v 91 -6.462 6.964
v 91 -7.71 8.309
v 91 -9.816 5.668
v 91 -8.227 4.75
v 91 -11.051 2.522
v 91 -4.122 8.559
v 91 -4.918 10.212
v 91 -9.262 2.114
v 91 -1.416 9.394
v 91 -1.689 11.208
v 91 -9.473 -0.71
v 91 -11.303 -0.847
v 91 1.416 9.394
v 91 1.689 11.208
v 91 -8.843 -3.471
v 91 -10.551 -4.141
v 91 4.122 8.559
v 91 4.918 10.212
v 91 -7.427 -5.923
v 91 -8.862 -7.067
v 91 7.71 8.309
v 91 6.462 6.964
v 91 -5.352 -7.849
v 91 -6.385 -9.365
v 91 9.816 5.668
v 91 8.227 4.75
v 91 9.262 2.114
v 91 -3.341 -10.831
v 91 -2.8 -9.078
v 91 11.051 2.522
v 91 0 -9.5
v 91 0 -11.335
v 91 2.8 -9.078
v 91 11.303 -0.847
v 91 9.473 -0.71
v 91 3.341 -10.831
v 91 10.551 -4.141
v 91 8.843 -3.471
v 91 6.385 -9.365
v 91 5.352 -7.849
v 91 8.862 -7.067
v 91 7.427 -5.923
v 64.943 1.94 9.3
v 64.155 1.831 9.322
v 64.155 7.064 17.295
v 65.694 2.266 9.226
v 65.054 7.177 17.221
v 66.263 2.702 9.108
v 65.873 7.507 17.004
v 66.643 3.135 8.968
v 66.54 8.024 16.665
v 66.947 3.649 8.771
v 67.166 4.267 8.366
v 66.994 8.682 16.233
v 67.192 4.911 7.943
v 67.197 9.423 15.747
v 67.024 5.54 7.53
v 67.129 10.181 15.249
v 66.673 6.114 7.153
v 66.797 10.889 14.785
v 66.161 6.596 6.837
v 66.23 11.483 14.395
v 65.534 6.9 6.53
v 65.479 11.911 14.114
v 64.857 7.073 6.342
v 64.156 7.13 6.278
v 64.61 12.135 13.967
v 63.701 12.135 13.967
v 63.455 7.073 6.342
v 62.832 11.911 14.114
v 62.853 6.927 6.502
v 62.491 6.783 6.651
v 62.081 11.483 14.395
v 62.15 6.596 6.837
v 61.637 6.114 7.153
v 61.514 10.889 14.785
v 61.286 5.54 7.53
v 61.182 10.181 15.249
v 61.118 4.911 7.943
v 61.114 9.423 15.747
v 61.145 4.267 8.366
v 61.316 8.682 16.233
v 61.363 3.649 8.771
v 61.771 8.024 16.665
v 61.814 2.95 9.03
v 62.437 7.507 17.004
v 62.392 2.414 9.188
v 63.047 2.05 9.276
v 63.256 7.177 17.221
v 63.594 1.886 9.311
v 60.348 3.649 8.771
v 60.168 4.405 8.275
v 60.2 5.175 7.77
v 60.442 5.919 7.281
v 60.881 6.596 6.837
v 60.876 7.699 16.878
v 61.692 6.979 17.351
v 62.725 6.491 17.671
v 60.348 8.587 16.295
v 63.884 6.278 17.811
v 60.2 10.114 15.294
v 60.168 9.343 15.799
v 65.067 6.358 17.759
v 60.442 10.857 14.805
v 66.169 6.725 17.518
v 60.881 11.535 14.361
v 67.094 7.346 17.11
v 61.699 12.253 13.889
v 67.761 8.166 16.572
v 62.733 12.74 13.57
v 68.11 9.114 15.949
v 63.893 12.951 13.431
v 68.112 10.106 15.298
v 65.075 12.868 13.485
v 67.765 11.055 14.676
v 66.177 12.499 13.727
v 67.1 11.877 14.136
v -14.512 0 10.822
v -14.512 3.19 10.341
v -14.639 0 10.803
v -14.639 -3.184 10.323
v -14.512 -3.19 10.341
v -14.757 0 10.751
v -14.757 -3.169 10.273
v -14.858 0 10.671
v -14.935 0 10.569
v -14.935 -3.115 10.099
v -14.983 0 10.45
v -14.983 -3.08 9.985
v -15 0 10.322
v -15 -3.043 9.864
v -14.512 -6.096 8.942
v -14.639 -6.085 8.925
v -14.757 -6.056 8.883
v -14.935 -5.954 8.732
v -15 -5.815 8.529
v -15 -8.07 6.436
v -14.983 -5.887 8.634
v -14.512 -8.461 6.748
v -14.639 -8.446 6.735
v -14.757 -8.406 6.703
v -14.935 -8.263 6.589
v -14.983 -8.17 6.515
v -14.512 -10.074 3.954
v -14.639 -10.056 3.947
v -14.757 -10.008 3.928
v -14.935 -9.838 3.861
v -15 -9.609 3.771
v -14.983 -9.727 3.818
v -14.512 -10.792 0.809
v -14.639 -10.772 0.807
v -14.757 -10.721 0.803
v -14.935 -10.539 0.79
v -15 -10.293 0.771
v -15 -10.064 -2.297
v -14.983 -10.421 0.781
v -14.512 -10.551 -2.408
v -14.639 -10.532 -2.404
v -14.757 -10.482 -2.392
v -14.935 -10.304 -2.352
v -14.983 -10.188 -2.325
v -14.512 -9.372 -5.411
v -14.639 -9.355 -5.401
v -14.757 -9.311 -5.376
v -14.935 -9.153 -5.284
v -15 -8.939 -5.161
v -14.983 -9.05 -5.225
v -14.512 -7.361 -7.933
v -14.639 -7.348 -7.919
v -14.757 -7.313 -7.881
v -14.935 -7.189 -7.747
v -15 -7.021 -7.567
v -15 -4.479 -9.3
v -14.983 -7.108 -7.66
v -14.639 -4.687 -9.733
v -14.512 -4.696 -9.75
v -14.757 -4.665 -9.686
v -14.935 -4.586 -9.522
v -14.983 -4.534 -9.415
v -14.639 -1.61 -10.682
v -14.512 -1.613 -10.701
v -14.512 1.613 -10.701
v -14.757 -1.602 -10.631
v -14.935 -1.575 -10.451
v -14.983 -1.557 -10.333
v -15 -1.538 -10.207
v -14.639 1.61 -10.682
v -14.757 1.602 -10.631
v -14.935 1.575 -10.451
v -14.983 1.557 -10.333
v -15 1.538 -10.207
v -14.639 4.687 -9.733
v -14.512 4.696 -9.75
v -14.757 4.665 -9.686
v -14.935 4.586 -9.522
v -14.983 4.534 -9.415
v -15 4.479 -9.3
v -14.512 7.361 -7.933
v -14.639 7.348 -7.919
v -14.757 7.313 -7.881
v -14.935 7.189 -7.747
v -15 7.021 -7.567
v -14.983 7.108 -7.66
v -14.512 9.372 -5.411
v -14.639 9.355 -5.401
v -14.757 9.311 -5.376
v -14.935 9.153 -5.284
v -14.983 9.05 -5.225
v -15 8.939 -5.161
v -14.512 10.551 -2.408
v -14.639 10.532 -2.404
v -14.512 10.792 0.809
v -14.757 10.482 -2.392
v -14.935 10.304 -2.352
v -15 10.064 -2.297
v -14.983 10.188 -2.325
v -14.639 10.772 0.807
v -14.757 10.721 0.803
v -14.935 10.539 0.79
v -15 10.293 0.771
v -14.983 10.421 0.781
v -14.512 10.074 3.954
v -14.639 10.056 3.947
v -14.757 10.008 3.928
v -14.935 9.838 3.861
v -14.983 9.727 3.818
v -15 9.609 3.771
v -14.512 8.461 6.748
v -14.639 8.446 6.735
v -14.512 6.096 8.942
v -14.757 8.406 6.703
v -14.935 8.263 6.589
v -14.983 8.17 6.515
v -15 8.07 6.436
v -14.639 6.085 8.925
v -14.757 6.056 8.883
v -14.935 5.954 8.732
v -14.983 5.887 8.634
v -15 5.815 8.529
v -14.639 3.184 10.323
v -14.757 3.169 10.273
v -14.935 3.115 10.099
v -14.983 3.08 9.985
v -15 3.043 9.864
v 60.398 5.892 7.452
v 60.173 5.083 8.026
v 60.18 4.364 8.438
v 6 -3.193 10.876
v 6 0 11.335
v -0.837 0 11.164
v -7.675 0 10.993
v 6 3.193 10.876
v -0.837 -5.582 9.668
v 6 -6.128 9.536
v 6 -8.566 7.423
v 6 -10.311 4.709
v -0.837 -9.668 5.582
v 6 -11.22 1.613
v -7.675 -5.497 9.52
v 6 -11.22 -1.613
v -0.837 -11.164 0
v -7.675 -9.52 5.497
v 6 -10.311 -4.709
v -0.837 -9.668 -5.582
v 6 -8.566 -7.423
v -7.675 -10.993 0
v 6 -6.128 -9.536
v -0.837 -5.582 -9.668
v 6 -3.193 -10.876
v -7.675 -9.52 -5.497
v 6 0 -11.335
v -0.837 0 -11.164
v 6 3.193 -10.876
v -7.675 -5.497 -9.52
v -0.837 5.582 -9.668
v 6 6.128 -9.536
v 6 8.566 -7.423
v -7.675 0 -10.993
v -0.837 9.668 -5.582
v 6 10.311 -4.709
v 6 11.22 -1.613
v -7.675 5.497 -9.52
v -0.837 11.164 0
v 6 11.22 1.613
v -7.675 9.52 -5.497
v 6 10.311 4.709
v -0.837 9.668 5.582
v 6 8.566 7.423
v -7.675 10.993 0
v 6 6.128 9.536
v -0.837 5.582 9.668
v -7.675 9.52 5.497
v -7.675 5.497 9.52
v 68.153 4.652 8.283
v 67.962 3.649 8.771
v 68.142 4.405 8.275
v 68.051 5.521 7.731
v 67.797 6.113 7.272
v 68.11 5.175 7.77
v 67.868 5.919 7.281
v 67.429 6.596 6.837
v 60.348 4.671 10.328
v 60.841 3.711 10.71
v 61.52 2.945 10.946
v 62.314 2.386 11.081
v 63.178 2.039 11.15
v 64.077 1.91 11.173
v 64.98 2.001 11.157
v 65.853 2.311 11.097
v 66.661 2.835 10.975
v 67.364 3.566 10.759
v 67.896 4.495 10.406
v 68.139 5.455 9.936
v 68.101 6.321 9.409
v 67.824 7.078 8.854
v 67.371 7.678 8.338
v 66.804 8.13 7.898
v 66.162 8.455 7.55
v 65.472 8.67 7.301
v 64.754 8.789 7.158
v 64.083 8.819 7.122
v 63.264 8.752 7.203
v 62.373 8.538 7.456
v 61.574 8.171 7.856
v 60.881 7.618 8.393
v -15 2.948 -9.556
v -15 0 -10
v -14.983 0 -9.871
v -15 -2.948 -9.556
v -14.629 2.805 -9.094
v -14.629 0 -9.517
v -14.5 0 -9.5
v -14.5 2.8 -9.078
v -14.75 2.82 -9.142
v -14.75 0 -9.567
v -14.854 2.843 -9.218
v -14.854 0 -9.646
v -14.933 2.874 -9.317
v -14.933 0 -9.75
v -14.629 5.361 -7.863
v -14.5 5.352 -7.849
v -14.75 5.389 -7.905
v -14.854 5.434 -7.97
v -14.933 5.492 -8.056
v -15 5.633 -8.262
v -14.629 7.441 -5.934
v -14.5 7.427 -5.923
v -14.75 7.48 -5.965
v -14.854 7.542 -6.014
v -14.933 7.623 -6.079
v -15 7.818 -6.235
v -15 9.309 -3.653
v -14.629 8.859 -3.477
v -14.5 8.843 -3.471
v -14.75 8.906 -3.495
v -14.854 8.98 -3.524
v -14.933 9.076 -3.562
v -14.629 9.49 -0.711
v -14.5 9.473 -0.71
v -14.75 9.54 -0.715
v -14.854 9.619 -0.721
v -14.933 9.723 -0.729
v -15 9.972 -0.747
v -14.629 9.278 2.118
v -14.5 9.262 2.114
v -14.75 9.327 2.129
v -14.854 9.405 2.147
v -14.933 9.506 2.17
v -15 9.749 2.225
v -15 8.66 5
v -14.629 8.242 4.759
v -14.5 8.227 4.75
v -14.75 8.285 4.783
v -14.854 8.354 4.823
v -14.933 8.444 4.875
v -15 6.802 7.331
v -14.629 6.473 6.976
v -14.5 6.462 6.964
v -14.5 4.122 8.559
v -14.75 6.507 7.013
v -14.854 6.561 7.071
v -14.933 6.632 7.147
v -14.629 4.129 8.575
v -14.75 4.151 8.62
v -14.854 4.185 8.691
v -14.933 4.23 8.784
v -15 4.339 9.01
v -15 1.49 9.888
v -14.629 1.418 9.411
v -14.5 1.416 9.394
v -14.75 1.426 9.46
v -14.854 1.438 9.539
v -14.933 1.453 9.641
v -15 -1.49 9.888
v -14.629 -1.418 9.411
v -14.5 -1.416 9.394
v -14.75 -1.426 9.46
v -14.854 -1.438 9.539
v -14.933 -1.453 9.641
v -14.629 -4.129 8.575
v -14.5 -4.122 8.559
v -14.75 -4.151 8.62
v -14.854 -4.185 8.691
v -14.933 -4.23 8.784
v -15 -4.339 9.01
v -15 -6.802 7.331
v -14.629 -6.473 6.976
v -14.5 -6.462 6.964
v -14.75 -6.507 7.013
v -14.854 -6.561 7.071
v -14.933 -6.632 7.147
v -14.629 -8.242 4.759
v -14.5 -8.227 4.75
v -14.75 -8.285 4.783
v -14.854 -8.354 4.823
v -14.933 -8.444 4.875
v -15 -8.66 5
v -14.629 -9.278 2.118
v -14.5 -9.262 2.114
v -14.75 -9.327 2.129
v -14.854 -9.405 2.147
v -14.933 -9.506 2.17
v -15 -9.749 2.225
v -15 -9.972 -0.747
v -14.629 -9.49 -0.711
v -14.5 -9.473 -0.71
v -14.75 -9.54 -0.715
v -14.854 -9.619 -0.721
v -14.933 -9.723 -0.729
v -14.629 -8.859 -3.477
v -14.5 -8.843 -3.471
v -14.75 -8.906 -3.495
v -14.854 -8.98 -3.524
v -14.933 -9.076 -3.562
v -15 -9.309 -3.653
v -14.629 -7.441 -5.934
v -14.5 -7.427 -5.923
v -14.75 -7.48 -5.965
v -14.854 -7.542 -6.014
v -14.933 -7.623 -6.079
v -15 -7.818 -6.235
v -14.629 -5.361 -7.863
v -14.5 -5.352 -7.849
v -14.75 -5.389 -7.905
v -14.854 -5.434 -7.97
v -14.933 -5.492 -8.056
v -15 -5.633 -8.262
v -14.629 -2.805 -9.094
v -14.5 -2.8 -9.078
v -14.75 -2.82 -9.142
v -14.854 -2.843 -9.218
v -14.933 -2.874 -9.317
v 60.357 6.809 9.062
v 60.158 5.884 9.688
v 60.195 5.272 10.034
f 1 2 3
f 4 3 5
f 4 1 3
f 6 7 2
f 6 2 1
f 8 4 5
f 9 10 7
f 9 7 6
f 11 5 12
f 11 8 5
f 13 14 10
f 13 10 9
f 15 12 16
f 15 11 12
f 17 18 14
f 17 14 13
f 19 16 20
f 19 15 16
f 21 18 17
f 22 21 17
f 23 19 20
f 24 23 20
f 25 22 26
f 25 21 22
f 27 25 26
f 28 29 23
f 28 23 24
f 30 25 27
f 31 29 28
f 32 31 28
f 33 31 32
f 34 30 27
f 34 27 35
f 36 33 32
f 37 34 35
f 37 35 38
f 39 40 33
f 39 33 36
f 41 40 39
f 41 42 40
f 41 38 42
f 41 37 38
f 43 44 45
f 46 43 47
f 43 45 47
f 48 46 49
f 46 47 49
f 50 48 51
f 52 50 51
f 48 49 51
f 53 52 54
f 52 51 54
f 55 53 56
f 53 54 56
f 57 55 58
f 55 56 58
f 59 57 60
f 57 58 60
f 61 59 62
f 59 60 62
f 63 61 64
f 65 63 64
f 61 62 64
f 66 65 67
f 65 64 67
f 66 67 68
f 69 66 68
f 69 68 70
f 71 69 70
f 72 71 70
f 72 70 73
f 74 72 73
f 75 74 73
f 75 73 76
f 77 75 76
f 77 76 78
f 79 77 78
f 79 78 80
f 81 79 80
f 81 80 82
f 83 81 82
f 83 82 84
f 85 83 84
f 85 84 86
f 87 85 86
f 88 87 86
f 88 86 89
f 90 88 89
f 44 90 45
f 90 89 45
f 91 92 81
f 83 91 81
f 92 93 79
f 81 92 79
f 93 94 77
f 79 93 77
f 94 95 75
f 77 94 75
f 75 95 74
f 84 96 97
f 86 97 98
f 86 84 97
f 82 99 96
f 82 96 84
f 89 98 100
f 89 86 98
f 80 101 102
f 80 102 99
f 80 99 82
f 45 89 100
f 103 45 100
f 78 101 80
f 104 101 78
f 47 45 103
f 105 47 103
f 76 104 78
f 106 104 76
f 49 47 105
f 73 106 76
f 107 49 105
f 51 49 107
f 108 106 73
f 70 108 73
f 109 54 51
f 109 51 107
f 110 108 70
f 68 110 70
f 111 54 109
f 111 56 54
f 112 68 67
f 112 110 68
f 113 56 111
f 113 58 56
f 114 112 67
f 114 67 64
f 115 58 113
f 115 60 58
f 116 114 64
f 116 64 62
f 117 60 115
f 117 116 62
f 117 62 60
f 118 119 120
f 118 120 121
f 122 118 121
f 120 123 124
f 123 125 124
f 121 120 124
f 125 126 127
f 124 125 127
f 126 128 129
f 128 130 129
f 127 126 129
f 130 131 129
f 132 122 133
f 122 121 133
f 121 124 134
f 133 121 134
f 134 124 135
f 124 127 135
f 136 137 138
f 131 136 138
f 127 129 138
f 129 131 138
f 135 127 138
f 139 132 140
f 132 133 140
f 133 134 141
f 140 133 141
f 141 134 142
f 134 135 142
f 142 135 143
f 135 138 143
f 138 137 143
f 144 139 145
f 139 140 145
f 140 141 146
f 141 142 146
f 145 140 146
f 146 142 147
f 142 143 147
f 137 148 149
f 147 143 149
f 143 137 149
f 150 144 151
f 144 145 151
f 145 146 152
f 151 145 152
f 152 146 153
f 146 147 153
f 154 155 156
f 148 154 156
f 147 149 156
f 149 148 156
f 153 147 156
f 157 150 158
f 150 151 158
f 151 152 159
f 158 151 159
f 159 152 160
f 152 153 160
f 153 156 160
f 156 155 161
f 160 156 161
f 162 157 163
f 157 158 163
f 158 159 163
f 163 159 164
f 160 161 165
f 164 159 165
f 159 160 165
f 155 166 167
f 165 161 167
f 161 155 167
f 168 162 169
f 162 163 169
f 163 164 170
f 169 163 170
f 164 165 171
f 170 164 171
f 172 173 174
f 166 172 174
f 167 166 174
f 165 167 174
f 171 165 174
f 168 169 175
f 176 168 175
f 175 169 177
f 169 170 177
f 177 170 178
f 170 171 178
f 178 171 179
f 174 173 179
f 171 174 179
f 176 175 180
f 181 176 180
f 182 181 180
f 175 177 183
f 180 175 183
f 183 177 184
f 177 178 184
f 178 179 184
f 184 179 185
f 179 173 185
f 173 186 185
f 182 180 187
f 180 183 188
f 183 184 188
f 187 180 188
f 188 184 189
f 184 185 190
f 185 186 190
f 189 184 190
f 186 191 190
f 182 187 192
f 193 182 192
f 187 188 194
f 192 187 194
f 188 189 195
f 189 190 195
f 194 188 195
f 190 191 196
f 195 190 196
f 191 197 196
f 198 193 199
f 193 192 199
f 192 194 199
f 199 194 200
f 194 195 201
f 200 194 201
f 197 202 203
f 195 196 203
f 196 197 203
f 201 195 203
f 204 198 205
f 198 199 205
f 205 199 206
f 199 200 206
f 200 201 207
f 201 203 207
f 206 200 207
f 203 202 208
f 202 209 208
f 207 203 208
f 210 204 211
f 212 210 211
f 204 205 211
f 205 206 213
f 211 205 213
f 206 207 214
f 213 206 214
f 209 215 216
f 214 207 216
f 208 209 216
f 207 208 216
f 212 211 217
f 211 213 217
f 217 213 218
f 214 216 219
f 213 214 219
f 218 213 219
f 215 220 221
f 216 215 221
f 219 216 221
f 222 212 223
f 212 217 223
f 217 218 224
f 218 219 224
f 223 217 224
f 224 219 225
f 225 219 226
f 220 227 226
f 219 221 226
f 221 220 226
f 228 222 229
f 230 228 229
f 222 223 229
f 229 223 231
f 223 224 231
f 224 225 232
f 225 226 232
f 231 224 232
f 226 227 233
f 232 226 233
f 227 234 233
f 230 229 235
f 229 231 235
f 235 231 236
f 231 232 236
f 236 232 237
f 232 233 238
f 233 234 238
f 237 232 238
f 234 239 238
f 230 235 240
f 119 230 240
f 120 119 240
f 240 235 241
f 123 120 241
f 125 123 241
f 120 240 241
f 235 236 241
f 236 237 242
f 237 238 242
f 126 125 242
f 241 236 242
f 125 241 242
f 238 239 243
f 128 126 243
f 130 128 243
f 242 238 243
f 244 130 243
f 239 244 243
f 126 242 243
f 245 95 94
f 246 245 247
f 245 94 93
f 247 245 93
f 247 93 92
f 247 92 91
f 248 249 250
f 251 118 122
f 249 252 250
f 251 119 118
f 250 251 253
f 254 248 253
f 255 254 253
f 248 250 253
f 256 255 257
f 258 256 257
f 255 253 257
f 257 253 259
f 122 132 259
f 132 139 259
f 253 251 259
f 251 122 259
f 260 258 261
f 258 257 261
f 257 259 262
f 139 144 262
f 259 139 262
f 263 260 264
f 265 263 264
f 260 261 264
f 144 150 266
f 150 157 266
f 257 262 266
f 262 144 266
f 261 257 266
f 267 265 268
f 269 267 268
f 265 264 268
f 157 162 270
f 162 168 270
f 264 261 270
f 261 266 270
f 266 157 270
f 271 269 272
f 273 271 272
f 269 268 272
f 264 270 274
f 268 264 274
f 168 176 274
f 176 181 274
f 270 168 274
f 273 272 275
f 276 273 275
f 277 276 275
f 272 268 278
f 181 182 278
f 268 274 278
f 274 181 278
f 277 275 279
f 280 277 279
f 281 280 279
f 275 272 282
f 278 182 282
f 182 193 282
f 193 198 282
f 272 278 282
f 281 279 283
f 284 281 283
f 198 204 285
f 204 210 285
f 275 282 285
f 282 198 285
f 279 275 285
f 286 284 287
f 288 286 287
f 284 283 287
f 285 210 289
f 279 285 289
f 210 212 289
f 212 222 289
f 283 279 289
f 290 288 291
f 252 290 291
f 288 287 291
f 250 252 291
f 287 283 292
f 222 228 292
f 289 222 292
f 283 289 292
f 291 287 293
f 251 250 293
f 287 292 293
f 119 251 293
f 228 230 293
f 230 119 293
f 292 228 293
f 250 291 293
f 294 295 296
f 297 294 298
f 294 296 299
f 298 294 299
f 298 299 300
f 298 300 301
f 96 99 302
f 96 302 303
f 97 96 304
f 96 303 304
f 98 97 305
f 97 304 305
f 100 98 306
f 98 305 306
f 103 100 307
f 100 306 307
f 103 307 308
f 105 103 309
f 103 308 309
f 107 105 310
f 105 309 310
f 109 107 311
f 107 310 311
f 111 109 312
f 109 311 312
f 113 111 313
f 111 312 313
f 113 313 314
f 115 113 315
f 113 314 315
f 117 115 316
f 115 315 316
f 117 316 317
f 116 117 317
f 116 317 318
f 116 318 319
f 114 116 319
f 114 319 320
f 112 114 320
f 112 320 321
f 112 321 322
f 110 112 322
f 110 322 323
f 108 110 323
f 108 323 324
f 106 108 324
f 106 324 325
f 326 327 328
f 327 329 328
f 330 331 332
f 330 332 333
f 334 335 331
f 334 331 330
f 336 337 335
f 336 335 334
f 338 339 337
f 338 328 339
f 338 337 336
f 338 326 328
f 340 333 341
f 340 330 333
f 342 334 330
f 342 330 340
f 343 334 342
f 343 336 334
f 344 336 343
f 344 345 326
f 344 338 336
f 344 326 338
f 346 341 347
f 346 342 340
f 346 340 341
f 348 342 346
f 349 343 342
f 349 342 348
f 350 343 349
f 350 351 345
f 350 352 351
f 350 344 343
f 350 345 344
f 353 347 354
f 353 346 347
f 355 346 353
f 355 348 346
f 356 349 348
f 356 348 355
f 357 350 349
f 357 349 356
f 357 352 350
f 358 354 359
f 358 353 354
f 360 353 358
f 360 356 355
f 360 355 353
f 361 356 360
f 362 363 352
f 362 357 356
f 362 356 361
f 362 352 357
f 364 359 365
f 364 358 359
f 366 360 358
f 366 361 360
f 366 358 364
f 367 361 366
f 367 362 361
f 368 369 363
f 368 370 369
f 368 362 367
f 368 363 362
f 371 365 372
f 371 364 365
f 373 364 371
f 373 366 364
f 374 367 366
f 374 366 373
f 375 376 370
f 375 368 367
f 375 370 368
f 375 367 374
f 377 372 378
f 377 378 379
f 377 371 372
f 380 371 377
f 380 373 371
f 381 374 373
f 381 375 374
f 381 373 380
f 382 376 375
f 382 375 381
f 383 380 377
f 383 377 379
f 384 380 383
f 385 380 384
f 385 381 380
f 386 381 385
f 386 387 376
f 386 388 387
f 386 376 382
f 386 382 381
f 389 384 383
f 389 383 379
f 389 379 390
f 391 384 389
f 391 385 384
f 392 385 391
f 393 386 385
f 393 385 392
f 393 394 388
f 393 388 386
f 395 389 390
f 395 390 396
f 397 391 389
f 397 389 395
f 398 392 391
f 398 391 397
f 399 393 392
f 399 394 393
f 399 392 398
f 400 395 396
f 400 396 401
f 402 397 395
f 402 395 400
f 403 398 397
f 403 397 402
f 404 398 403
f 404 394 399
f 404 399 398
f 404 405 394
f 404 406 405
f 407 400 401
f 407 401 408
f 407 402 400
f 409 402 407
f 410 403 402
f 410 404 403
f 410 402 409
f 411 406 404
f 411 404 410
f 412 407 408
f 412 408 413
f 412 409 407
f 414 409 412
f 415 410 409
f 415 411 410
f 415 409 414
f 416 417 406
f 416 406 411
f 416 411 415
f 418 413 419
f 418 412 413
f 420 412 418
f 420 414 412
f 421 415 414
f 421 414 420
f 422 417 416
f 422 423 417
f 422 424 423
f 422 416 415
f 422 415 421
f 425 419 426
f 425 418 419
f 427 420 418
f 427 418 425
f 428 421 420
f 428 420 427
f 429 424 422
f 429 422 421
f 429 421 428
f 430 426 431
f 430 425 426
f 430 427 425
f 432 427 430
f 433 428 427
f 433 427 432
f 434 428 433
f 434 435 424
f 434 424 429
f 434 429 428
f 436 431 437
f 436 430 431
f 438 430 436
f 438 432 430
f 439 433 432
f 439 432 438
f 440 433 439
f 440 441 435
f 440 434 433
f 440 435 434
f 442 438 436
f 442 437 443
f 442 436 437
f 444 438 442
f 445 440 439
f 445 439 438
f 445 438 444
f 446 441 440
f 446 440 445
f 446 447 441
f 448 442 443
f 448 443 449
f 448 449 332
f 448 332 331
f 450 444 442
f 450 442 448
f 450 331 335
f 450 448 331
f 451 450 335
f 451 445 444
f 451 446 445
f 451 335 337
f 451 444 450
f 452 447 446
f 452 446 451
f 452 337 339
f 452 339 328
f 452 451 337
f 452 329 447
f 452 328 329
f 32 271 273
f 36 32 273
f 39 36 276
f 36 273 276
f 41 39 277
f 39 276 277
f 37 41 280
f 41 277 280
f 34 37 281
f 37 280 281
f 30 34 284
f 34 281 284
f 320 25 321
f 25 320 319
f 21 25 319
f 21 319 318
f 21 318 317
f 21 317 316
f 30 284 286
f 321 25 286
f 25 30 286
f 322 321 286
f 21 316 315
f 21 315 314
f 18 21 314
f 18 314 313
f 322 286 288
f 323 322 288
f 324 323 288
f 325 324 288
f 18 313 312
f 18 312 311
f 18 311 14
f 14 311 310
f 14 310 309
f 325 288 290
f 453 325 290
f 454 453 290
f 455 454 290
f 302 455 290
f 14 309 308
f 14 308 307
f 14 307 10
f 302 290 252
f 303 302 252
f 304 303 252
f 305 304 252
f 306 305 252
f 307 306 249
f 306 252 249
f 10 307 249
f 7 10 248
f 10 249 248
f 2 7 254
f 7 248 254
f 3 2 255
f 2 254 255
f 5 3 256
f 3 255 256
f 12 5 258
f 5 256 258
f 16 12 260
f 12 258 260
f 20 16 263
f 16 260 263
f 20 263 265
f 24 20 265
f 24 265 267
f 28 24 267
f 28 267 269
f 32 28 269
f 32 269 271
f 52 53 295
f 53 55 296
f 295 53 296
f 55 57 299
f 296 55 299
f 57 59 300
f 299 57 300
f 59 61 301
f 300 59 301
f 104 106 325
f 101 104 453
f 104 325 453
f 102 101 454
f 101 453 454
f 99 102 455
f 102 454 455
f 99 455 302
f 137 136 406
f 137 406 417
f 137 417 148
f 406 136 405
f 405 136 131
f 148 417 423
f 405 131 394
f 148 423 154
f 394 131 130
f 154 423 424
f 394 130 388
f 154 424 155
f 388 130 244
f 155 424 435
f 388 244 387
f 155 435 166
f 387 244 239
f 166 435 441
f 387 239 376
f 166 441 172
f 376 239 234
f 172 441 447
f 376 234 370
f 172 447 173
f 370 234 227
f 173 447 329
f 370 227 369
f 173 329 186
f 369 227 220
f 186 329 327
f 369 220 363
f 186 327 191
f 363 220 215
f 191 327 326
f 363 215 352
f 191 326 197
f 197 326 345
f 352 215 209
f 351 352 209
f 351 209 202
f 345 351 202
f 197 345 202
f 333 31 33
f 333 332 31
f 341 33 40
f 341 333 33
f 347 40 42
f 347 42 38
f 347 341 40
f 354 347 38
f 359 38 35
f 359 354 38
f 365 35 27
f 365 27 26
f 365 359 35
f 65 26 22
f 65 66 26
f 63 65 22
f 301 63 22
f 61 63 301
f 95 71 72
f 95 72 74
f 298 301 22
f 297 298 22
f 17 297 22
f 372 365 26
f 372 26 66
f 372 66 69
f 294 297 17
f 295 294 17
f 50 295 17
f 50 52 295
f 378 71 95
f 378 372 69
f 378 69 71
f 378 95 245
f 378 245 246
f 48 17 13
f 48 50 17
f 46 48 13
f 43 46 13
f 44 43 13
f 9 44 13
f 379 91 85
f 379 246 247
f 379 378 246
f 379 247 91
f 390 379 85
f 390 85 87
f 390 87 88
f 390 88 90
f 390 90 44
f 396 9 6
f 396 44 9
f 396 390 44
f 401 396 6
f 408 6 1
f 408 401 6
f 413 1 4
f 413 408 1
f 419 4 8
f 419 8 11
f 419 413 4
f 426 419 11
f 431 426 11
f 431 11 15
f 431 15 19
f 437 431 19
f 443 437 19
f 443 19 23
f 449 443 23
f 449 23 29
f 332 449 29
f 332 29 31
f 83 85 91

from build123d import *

# Parameters (mm, degrees)
BOSS_EXTRUDE1_START = -21
SKETCH2_R           = 10.322343774
SKETCH2_R_2         = 9.5
BOSS_EXTRUDE1_DEPTH = 21
FILLET1_R           = 0.5
SKETCH3_R           = 11.335
SKETCH3_R_2         = 9.5
BOSS_EXTRUDE2_DEPTH = 85
BOSS_EXTRUDE3_START = 9.334999999
BOSS_EXTRUDE3_DEPTH = 8.999999999
SKETCH5_R           = 3.050000003
CUT_EXTRUDE1_DEPTH  = 11


# Read off the part's stored shape, not the designer's step: Boss-Extrude3
with BuildPart() as part:
    # Sketch1 → Revolve1 (revolve)
    with BuildSketch(Plane.XY, mode=Mode.PRIVATE) as revolve1_sk:
        with BuildLine():
            Line((6, 11.335), (-14.512496096, 10.822187598))
            ThreePointArc((-14.512496096, 10.822187598), (-14.857944163, 10.671451174), (-15, 10.322343774))
            Line((-15, 10.322343774), (6, 10.322343774))
            Line((6, 10.322343774), (6, 11.335))
        make_face()
    revolve(revolve1_sk.sketch.rotate(Axis((-15.624243475, 0, 0), (1, 0, 0)), 90), axis=Axis((-15.624243475, 0, 0), (1, 0, 0)))

    # Sketch2 → Boss-Extrude1 (add)
    with BuildSketch(Plane(origin=(6, 0, 0), x_dir=(0, 0, -1), z_dir=(1, 0, 0)).offset(BOSS_EXTRUDE1_START)):
        Circle(SKETCH2_R)
        Circle(SKETCH2_R_2, mode=Mode.SUBTRACT)
    extrude(amount=BOSS_EXTRUDE1_DEPTH)

    # Fillet1
    fillet1_edges = [part.edges().sort_by_distance(p)[0] for p in [
        (-15, 0, 9.5),
    ]]
    fillet(fillet1_edges, radius=FILLET1_R)

    # Sketch3 → Boss-Extrude2 (add)
    with BuildSketch(Plane(origin=(6, 0, 0), x_dir=(0, 0, -1), z_dir=(1, 0, 0))):
        Circle(SKETCH3_R)
        Circle(SKETCH3_R_2, mode=Mode.SUBTRACT)
    extrude(amount=BOSS_EXTRUDE2_DEPTH)

    # Boss-Extrude3 outline → Boss-Extrude3 (add)
    with BuildSketch(Plane(origin=(0, 0, 0), x_dir=(1, 0, 0), z_dir=(0, 0.5487408887134131, 0.8359924862425581)).offset(BOSS_EXTRUDE3_START)):
        with BuildLine():
            ThreePointArc((60.34828113, -1.762888304), (68.110256528, -1.132677071), (60.881070562, 1.762888255))
            ThreePointArc((60.881070562, 1.762888255), (60.200061526, 0.062653443), (60.34828113, -1.762888304))
        make_face()
    extrude(amount=BOSS_EXTRUDE3_DEPTH)

    # Sketch5 → Cut-Extrude1 (cut)
    with BuildSketch(Plane(origin=(0, 10.061164202, 15.32792223), x_dir=(1, 0, 0), z_dir=(1.7486012637846212e-15, 0.5487408891490924, 0.8359924859565806))):
        with Locations(Location((64.155159027, -0.535011823, 0), (0, 0, 270))):
            Circle(SKETCH5_R)
    extrude(amount=-CUT_EXTRUDE1_DEPTH, mode=Mode.SUBTRACT)


solid = part.part
